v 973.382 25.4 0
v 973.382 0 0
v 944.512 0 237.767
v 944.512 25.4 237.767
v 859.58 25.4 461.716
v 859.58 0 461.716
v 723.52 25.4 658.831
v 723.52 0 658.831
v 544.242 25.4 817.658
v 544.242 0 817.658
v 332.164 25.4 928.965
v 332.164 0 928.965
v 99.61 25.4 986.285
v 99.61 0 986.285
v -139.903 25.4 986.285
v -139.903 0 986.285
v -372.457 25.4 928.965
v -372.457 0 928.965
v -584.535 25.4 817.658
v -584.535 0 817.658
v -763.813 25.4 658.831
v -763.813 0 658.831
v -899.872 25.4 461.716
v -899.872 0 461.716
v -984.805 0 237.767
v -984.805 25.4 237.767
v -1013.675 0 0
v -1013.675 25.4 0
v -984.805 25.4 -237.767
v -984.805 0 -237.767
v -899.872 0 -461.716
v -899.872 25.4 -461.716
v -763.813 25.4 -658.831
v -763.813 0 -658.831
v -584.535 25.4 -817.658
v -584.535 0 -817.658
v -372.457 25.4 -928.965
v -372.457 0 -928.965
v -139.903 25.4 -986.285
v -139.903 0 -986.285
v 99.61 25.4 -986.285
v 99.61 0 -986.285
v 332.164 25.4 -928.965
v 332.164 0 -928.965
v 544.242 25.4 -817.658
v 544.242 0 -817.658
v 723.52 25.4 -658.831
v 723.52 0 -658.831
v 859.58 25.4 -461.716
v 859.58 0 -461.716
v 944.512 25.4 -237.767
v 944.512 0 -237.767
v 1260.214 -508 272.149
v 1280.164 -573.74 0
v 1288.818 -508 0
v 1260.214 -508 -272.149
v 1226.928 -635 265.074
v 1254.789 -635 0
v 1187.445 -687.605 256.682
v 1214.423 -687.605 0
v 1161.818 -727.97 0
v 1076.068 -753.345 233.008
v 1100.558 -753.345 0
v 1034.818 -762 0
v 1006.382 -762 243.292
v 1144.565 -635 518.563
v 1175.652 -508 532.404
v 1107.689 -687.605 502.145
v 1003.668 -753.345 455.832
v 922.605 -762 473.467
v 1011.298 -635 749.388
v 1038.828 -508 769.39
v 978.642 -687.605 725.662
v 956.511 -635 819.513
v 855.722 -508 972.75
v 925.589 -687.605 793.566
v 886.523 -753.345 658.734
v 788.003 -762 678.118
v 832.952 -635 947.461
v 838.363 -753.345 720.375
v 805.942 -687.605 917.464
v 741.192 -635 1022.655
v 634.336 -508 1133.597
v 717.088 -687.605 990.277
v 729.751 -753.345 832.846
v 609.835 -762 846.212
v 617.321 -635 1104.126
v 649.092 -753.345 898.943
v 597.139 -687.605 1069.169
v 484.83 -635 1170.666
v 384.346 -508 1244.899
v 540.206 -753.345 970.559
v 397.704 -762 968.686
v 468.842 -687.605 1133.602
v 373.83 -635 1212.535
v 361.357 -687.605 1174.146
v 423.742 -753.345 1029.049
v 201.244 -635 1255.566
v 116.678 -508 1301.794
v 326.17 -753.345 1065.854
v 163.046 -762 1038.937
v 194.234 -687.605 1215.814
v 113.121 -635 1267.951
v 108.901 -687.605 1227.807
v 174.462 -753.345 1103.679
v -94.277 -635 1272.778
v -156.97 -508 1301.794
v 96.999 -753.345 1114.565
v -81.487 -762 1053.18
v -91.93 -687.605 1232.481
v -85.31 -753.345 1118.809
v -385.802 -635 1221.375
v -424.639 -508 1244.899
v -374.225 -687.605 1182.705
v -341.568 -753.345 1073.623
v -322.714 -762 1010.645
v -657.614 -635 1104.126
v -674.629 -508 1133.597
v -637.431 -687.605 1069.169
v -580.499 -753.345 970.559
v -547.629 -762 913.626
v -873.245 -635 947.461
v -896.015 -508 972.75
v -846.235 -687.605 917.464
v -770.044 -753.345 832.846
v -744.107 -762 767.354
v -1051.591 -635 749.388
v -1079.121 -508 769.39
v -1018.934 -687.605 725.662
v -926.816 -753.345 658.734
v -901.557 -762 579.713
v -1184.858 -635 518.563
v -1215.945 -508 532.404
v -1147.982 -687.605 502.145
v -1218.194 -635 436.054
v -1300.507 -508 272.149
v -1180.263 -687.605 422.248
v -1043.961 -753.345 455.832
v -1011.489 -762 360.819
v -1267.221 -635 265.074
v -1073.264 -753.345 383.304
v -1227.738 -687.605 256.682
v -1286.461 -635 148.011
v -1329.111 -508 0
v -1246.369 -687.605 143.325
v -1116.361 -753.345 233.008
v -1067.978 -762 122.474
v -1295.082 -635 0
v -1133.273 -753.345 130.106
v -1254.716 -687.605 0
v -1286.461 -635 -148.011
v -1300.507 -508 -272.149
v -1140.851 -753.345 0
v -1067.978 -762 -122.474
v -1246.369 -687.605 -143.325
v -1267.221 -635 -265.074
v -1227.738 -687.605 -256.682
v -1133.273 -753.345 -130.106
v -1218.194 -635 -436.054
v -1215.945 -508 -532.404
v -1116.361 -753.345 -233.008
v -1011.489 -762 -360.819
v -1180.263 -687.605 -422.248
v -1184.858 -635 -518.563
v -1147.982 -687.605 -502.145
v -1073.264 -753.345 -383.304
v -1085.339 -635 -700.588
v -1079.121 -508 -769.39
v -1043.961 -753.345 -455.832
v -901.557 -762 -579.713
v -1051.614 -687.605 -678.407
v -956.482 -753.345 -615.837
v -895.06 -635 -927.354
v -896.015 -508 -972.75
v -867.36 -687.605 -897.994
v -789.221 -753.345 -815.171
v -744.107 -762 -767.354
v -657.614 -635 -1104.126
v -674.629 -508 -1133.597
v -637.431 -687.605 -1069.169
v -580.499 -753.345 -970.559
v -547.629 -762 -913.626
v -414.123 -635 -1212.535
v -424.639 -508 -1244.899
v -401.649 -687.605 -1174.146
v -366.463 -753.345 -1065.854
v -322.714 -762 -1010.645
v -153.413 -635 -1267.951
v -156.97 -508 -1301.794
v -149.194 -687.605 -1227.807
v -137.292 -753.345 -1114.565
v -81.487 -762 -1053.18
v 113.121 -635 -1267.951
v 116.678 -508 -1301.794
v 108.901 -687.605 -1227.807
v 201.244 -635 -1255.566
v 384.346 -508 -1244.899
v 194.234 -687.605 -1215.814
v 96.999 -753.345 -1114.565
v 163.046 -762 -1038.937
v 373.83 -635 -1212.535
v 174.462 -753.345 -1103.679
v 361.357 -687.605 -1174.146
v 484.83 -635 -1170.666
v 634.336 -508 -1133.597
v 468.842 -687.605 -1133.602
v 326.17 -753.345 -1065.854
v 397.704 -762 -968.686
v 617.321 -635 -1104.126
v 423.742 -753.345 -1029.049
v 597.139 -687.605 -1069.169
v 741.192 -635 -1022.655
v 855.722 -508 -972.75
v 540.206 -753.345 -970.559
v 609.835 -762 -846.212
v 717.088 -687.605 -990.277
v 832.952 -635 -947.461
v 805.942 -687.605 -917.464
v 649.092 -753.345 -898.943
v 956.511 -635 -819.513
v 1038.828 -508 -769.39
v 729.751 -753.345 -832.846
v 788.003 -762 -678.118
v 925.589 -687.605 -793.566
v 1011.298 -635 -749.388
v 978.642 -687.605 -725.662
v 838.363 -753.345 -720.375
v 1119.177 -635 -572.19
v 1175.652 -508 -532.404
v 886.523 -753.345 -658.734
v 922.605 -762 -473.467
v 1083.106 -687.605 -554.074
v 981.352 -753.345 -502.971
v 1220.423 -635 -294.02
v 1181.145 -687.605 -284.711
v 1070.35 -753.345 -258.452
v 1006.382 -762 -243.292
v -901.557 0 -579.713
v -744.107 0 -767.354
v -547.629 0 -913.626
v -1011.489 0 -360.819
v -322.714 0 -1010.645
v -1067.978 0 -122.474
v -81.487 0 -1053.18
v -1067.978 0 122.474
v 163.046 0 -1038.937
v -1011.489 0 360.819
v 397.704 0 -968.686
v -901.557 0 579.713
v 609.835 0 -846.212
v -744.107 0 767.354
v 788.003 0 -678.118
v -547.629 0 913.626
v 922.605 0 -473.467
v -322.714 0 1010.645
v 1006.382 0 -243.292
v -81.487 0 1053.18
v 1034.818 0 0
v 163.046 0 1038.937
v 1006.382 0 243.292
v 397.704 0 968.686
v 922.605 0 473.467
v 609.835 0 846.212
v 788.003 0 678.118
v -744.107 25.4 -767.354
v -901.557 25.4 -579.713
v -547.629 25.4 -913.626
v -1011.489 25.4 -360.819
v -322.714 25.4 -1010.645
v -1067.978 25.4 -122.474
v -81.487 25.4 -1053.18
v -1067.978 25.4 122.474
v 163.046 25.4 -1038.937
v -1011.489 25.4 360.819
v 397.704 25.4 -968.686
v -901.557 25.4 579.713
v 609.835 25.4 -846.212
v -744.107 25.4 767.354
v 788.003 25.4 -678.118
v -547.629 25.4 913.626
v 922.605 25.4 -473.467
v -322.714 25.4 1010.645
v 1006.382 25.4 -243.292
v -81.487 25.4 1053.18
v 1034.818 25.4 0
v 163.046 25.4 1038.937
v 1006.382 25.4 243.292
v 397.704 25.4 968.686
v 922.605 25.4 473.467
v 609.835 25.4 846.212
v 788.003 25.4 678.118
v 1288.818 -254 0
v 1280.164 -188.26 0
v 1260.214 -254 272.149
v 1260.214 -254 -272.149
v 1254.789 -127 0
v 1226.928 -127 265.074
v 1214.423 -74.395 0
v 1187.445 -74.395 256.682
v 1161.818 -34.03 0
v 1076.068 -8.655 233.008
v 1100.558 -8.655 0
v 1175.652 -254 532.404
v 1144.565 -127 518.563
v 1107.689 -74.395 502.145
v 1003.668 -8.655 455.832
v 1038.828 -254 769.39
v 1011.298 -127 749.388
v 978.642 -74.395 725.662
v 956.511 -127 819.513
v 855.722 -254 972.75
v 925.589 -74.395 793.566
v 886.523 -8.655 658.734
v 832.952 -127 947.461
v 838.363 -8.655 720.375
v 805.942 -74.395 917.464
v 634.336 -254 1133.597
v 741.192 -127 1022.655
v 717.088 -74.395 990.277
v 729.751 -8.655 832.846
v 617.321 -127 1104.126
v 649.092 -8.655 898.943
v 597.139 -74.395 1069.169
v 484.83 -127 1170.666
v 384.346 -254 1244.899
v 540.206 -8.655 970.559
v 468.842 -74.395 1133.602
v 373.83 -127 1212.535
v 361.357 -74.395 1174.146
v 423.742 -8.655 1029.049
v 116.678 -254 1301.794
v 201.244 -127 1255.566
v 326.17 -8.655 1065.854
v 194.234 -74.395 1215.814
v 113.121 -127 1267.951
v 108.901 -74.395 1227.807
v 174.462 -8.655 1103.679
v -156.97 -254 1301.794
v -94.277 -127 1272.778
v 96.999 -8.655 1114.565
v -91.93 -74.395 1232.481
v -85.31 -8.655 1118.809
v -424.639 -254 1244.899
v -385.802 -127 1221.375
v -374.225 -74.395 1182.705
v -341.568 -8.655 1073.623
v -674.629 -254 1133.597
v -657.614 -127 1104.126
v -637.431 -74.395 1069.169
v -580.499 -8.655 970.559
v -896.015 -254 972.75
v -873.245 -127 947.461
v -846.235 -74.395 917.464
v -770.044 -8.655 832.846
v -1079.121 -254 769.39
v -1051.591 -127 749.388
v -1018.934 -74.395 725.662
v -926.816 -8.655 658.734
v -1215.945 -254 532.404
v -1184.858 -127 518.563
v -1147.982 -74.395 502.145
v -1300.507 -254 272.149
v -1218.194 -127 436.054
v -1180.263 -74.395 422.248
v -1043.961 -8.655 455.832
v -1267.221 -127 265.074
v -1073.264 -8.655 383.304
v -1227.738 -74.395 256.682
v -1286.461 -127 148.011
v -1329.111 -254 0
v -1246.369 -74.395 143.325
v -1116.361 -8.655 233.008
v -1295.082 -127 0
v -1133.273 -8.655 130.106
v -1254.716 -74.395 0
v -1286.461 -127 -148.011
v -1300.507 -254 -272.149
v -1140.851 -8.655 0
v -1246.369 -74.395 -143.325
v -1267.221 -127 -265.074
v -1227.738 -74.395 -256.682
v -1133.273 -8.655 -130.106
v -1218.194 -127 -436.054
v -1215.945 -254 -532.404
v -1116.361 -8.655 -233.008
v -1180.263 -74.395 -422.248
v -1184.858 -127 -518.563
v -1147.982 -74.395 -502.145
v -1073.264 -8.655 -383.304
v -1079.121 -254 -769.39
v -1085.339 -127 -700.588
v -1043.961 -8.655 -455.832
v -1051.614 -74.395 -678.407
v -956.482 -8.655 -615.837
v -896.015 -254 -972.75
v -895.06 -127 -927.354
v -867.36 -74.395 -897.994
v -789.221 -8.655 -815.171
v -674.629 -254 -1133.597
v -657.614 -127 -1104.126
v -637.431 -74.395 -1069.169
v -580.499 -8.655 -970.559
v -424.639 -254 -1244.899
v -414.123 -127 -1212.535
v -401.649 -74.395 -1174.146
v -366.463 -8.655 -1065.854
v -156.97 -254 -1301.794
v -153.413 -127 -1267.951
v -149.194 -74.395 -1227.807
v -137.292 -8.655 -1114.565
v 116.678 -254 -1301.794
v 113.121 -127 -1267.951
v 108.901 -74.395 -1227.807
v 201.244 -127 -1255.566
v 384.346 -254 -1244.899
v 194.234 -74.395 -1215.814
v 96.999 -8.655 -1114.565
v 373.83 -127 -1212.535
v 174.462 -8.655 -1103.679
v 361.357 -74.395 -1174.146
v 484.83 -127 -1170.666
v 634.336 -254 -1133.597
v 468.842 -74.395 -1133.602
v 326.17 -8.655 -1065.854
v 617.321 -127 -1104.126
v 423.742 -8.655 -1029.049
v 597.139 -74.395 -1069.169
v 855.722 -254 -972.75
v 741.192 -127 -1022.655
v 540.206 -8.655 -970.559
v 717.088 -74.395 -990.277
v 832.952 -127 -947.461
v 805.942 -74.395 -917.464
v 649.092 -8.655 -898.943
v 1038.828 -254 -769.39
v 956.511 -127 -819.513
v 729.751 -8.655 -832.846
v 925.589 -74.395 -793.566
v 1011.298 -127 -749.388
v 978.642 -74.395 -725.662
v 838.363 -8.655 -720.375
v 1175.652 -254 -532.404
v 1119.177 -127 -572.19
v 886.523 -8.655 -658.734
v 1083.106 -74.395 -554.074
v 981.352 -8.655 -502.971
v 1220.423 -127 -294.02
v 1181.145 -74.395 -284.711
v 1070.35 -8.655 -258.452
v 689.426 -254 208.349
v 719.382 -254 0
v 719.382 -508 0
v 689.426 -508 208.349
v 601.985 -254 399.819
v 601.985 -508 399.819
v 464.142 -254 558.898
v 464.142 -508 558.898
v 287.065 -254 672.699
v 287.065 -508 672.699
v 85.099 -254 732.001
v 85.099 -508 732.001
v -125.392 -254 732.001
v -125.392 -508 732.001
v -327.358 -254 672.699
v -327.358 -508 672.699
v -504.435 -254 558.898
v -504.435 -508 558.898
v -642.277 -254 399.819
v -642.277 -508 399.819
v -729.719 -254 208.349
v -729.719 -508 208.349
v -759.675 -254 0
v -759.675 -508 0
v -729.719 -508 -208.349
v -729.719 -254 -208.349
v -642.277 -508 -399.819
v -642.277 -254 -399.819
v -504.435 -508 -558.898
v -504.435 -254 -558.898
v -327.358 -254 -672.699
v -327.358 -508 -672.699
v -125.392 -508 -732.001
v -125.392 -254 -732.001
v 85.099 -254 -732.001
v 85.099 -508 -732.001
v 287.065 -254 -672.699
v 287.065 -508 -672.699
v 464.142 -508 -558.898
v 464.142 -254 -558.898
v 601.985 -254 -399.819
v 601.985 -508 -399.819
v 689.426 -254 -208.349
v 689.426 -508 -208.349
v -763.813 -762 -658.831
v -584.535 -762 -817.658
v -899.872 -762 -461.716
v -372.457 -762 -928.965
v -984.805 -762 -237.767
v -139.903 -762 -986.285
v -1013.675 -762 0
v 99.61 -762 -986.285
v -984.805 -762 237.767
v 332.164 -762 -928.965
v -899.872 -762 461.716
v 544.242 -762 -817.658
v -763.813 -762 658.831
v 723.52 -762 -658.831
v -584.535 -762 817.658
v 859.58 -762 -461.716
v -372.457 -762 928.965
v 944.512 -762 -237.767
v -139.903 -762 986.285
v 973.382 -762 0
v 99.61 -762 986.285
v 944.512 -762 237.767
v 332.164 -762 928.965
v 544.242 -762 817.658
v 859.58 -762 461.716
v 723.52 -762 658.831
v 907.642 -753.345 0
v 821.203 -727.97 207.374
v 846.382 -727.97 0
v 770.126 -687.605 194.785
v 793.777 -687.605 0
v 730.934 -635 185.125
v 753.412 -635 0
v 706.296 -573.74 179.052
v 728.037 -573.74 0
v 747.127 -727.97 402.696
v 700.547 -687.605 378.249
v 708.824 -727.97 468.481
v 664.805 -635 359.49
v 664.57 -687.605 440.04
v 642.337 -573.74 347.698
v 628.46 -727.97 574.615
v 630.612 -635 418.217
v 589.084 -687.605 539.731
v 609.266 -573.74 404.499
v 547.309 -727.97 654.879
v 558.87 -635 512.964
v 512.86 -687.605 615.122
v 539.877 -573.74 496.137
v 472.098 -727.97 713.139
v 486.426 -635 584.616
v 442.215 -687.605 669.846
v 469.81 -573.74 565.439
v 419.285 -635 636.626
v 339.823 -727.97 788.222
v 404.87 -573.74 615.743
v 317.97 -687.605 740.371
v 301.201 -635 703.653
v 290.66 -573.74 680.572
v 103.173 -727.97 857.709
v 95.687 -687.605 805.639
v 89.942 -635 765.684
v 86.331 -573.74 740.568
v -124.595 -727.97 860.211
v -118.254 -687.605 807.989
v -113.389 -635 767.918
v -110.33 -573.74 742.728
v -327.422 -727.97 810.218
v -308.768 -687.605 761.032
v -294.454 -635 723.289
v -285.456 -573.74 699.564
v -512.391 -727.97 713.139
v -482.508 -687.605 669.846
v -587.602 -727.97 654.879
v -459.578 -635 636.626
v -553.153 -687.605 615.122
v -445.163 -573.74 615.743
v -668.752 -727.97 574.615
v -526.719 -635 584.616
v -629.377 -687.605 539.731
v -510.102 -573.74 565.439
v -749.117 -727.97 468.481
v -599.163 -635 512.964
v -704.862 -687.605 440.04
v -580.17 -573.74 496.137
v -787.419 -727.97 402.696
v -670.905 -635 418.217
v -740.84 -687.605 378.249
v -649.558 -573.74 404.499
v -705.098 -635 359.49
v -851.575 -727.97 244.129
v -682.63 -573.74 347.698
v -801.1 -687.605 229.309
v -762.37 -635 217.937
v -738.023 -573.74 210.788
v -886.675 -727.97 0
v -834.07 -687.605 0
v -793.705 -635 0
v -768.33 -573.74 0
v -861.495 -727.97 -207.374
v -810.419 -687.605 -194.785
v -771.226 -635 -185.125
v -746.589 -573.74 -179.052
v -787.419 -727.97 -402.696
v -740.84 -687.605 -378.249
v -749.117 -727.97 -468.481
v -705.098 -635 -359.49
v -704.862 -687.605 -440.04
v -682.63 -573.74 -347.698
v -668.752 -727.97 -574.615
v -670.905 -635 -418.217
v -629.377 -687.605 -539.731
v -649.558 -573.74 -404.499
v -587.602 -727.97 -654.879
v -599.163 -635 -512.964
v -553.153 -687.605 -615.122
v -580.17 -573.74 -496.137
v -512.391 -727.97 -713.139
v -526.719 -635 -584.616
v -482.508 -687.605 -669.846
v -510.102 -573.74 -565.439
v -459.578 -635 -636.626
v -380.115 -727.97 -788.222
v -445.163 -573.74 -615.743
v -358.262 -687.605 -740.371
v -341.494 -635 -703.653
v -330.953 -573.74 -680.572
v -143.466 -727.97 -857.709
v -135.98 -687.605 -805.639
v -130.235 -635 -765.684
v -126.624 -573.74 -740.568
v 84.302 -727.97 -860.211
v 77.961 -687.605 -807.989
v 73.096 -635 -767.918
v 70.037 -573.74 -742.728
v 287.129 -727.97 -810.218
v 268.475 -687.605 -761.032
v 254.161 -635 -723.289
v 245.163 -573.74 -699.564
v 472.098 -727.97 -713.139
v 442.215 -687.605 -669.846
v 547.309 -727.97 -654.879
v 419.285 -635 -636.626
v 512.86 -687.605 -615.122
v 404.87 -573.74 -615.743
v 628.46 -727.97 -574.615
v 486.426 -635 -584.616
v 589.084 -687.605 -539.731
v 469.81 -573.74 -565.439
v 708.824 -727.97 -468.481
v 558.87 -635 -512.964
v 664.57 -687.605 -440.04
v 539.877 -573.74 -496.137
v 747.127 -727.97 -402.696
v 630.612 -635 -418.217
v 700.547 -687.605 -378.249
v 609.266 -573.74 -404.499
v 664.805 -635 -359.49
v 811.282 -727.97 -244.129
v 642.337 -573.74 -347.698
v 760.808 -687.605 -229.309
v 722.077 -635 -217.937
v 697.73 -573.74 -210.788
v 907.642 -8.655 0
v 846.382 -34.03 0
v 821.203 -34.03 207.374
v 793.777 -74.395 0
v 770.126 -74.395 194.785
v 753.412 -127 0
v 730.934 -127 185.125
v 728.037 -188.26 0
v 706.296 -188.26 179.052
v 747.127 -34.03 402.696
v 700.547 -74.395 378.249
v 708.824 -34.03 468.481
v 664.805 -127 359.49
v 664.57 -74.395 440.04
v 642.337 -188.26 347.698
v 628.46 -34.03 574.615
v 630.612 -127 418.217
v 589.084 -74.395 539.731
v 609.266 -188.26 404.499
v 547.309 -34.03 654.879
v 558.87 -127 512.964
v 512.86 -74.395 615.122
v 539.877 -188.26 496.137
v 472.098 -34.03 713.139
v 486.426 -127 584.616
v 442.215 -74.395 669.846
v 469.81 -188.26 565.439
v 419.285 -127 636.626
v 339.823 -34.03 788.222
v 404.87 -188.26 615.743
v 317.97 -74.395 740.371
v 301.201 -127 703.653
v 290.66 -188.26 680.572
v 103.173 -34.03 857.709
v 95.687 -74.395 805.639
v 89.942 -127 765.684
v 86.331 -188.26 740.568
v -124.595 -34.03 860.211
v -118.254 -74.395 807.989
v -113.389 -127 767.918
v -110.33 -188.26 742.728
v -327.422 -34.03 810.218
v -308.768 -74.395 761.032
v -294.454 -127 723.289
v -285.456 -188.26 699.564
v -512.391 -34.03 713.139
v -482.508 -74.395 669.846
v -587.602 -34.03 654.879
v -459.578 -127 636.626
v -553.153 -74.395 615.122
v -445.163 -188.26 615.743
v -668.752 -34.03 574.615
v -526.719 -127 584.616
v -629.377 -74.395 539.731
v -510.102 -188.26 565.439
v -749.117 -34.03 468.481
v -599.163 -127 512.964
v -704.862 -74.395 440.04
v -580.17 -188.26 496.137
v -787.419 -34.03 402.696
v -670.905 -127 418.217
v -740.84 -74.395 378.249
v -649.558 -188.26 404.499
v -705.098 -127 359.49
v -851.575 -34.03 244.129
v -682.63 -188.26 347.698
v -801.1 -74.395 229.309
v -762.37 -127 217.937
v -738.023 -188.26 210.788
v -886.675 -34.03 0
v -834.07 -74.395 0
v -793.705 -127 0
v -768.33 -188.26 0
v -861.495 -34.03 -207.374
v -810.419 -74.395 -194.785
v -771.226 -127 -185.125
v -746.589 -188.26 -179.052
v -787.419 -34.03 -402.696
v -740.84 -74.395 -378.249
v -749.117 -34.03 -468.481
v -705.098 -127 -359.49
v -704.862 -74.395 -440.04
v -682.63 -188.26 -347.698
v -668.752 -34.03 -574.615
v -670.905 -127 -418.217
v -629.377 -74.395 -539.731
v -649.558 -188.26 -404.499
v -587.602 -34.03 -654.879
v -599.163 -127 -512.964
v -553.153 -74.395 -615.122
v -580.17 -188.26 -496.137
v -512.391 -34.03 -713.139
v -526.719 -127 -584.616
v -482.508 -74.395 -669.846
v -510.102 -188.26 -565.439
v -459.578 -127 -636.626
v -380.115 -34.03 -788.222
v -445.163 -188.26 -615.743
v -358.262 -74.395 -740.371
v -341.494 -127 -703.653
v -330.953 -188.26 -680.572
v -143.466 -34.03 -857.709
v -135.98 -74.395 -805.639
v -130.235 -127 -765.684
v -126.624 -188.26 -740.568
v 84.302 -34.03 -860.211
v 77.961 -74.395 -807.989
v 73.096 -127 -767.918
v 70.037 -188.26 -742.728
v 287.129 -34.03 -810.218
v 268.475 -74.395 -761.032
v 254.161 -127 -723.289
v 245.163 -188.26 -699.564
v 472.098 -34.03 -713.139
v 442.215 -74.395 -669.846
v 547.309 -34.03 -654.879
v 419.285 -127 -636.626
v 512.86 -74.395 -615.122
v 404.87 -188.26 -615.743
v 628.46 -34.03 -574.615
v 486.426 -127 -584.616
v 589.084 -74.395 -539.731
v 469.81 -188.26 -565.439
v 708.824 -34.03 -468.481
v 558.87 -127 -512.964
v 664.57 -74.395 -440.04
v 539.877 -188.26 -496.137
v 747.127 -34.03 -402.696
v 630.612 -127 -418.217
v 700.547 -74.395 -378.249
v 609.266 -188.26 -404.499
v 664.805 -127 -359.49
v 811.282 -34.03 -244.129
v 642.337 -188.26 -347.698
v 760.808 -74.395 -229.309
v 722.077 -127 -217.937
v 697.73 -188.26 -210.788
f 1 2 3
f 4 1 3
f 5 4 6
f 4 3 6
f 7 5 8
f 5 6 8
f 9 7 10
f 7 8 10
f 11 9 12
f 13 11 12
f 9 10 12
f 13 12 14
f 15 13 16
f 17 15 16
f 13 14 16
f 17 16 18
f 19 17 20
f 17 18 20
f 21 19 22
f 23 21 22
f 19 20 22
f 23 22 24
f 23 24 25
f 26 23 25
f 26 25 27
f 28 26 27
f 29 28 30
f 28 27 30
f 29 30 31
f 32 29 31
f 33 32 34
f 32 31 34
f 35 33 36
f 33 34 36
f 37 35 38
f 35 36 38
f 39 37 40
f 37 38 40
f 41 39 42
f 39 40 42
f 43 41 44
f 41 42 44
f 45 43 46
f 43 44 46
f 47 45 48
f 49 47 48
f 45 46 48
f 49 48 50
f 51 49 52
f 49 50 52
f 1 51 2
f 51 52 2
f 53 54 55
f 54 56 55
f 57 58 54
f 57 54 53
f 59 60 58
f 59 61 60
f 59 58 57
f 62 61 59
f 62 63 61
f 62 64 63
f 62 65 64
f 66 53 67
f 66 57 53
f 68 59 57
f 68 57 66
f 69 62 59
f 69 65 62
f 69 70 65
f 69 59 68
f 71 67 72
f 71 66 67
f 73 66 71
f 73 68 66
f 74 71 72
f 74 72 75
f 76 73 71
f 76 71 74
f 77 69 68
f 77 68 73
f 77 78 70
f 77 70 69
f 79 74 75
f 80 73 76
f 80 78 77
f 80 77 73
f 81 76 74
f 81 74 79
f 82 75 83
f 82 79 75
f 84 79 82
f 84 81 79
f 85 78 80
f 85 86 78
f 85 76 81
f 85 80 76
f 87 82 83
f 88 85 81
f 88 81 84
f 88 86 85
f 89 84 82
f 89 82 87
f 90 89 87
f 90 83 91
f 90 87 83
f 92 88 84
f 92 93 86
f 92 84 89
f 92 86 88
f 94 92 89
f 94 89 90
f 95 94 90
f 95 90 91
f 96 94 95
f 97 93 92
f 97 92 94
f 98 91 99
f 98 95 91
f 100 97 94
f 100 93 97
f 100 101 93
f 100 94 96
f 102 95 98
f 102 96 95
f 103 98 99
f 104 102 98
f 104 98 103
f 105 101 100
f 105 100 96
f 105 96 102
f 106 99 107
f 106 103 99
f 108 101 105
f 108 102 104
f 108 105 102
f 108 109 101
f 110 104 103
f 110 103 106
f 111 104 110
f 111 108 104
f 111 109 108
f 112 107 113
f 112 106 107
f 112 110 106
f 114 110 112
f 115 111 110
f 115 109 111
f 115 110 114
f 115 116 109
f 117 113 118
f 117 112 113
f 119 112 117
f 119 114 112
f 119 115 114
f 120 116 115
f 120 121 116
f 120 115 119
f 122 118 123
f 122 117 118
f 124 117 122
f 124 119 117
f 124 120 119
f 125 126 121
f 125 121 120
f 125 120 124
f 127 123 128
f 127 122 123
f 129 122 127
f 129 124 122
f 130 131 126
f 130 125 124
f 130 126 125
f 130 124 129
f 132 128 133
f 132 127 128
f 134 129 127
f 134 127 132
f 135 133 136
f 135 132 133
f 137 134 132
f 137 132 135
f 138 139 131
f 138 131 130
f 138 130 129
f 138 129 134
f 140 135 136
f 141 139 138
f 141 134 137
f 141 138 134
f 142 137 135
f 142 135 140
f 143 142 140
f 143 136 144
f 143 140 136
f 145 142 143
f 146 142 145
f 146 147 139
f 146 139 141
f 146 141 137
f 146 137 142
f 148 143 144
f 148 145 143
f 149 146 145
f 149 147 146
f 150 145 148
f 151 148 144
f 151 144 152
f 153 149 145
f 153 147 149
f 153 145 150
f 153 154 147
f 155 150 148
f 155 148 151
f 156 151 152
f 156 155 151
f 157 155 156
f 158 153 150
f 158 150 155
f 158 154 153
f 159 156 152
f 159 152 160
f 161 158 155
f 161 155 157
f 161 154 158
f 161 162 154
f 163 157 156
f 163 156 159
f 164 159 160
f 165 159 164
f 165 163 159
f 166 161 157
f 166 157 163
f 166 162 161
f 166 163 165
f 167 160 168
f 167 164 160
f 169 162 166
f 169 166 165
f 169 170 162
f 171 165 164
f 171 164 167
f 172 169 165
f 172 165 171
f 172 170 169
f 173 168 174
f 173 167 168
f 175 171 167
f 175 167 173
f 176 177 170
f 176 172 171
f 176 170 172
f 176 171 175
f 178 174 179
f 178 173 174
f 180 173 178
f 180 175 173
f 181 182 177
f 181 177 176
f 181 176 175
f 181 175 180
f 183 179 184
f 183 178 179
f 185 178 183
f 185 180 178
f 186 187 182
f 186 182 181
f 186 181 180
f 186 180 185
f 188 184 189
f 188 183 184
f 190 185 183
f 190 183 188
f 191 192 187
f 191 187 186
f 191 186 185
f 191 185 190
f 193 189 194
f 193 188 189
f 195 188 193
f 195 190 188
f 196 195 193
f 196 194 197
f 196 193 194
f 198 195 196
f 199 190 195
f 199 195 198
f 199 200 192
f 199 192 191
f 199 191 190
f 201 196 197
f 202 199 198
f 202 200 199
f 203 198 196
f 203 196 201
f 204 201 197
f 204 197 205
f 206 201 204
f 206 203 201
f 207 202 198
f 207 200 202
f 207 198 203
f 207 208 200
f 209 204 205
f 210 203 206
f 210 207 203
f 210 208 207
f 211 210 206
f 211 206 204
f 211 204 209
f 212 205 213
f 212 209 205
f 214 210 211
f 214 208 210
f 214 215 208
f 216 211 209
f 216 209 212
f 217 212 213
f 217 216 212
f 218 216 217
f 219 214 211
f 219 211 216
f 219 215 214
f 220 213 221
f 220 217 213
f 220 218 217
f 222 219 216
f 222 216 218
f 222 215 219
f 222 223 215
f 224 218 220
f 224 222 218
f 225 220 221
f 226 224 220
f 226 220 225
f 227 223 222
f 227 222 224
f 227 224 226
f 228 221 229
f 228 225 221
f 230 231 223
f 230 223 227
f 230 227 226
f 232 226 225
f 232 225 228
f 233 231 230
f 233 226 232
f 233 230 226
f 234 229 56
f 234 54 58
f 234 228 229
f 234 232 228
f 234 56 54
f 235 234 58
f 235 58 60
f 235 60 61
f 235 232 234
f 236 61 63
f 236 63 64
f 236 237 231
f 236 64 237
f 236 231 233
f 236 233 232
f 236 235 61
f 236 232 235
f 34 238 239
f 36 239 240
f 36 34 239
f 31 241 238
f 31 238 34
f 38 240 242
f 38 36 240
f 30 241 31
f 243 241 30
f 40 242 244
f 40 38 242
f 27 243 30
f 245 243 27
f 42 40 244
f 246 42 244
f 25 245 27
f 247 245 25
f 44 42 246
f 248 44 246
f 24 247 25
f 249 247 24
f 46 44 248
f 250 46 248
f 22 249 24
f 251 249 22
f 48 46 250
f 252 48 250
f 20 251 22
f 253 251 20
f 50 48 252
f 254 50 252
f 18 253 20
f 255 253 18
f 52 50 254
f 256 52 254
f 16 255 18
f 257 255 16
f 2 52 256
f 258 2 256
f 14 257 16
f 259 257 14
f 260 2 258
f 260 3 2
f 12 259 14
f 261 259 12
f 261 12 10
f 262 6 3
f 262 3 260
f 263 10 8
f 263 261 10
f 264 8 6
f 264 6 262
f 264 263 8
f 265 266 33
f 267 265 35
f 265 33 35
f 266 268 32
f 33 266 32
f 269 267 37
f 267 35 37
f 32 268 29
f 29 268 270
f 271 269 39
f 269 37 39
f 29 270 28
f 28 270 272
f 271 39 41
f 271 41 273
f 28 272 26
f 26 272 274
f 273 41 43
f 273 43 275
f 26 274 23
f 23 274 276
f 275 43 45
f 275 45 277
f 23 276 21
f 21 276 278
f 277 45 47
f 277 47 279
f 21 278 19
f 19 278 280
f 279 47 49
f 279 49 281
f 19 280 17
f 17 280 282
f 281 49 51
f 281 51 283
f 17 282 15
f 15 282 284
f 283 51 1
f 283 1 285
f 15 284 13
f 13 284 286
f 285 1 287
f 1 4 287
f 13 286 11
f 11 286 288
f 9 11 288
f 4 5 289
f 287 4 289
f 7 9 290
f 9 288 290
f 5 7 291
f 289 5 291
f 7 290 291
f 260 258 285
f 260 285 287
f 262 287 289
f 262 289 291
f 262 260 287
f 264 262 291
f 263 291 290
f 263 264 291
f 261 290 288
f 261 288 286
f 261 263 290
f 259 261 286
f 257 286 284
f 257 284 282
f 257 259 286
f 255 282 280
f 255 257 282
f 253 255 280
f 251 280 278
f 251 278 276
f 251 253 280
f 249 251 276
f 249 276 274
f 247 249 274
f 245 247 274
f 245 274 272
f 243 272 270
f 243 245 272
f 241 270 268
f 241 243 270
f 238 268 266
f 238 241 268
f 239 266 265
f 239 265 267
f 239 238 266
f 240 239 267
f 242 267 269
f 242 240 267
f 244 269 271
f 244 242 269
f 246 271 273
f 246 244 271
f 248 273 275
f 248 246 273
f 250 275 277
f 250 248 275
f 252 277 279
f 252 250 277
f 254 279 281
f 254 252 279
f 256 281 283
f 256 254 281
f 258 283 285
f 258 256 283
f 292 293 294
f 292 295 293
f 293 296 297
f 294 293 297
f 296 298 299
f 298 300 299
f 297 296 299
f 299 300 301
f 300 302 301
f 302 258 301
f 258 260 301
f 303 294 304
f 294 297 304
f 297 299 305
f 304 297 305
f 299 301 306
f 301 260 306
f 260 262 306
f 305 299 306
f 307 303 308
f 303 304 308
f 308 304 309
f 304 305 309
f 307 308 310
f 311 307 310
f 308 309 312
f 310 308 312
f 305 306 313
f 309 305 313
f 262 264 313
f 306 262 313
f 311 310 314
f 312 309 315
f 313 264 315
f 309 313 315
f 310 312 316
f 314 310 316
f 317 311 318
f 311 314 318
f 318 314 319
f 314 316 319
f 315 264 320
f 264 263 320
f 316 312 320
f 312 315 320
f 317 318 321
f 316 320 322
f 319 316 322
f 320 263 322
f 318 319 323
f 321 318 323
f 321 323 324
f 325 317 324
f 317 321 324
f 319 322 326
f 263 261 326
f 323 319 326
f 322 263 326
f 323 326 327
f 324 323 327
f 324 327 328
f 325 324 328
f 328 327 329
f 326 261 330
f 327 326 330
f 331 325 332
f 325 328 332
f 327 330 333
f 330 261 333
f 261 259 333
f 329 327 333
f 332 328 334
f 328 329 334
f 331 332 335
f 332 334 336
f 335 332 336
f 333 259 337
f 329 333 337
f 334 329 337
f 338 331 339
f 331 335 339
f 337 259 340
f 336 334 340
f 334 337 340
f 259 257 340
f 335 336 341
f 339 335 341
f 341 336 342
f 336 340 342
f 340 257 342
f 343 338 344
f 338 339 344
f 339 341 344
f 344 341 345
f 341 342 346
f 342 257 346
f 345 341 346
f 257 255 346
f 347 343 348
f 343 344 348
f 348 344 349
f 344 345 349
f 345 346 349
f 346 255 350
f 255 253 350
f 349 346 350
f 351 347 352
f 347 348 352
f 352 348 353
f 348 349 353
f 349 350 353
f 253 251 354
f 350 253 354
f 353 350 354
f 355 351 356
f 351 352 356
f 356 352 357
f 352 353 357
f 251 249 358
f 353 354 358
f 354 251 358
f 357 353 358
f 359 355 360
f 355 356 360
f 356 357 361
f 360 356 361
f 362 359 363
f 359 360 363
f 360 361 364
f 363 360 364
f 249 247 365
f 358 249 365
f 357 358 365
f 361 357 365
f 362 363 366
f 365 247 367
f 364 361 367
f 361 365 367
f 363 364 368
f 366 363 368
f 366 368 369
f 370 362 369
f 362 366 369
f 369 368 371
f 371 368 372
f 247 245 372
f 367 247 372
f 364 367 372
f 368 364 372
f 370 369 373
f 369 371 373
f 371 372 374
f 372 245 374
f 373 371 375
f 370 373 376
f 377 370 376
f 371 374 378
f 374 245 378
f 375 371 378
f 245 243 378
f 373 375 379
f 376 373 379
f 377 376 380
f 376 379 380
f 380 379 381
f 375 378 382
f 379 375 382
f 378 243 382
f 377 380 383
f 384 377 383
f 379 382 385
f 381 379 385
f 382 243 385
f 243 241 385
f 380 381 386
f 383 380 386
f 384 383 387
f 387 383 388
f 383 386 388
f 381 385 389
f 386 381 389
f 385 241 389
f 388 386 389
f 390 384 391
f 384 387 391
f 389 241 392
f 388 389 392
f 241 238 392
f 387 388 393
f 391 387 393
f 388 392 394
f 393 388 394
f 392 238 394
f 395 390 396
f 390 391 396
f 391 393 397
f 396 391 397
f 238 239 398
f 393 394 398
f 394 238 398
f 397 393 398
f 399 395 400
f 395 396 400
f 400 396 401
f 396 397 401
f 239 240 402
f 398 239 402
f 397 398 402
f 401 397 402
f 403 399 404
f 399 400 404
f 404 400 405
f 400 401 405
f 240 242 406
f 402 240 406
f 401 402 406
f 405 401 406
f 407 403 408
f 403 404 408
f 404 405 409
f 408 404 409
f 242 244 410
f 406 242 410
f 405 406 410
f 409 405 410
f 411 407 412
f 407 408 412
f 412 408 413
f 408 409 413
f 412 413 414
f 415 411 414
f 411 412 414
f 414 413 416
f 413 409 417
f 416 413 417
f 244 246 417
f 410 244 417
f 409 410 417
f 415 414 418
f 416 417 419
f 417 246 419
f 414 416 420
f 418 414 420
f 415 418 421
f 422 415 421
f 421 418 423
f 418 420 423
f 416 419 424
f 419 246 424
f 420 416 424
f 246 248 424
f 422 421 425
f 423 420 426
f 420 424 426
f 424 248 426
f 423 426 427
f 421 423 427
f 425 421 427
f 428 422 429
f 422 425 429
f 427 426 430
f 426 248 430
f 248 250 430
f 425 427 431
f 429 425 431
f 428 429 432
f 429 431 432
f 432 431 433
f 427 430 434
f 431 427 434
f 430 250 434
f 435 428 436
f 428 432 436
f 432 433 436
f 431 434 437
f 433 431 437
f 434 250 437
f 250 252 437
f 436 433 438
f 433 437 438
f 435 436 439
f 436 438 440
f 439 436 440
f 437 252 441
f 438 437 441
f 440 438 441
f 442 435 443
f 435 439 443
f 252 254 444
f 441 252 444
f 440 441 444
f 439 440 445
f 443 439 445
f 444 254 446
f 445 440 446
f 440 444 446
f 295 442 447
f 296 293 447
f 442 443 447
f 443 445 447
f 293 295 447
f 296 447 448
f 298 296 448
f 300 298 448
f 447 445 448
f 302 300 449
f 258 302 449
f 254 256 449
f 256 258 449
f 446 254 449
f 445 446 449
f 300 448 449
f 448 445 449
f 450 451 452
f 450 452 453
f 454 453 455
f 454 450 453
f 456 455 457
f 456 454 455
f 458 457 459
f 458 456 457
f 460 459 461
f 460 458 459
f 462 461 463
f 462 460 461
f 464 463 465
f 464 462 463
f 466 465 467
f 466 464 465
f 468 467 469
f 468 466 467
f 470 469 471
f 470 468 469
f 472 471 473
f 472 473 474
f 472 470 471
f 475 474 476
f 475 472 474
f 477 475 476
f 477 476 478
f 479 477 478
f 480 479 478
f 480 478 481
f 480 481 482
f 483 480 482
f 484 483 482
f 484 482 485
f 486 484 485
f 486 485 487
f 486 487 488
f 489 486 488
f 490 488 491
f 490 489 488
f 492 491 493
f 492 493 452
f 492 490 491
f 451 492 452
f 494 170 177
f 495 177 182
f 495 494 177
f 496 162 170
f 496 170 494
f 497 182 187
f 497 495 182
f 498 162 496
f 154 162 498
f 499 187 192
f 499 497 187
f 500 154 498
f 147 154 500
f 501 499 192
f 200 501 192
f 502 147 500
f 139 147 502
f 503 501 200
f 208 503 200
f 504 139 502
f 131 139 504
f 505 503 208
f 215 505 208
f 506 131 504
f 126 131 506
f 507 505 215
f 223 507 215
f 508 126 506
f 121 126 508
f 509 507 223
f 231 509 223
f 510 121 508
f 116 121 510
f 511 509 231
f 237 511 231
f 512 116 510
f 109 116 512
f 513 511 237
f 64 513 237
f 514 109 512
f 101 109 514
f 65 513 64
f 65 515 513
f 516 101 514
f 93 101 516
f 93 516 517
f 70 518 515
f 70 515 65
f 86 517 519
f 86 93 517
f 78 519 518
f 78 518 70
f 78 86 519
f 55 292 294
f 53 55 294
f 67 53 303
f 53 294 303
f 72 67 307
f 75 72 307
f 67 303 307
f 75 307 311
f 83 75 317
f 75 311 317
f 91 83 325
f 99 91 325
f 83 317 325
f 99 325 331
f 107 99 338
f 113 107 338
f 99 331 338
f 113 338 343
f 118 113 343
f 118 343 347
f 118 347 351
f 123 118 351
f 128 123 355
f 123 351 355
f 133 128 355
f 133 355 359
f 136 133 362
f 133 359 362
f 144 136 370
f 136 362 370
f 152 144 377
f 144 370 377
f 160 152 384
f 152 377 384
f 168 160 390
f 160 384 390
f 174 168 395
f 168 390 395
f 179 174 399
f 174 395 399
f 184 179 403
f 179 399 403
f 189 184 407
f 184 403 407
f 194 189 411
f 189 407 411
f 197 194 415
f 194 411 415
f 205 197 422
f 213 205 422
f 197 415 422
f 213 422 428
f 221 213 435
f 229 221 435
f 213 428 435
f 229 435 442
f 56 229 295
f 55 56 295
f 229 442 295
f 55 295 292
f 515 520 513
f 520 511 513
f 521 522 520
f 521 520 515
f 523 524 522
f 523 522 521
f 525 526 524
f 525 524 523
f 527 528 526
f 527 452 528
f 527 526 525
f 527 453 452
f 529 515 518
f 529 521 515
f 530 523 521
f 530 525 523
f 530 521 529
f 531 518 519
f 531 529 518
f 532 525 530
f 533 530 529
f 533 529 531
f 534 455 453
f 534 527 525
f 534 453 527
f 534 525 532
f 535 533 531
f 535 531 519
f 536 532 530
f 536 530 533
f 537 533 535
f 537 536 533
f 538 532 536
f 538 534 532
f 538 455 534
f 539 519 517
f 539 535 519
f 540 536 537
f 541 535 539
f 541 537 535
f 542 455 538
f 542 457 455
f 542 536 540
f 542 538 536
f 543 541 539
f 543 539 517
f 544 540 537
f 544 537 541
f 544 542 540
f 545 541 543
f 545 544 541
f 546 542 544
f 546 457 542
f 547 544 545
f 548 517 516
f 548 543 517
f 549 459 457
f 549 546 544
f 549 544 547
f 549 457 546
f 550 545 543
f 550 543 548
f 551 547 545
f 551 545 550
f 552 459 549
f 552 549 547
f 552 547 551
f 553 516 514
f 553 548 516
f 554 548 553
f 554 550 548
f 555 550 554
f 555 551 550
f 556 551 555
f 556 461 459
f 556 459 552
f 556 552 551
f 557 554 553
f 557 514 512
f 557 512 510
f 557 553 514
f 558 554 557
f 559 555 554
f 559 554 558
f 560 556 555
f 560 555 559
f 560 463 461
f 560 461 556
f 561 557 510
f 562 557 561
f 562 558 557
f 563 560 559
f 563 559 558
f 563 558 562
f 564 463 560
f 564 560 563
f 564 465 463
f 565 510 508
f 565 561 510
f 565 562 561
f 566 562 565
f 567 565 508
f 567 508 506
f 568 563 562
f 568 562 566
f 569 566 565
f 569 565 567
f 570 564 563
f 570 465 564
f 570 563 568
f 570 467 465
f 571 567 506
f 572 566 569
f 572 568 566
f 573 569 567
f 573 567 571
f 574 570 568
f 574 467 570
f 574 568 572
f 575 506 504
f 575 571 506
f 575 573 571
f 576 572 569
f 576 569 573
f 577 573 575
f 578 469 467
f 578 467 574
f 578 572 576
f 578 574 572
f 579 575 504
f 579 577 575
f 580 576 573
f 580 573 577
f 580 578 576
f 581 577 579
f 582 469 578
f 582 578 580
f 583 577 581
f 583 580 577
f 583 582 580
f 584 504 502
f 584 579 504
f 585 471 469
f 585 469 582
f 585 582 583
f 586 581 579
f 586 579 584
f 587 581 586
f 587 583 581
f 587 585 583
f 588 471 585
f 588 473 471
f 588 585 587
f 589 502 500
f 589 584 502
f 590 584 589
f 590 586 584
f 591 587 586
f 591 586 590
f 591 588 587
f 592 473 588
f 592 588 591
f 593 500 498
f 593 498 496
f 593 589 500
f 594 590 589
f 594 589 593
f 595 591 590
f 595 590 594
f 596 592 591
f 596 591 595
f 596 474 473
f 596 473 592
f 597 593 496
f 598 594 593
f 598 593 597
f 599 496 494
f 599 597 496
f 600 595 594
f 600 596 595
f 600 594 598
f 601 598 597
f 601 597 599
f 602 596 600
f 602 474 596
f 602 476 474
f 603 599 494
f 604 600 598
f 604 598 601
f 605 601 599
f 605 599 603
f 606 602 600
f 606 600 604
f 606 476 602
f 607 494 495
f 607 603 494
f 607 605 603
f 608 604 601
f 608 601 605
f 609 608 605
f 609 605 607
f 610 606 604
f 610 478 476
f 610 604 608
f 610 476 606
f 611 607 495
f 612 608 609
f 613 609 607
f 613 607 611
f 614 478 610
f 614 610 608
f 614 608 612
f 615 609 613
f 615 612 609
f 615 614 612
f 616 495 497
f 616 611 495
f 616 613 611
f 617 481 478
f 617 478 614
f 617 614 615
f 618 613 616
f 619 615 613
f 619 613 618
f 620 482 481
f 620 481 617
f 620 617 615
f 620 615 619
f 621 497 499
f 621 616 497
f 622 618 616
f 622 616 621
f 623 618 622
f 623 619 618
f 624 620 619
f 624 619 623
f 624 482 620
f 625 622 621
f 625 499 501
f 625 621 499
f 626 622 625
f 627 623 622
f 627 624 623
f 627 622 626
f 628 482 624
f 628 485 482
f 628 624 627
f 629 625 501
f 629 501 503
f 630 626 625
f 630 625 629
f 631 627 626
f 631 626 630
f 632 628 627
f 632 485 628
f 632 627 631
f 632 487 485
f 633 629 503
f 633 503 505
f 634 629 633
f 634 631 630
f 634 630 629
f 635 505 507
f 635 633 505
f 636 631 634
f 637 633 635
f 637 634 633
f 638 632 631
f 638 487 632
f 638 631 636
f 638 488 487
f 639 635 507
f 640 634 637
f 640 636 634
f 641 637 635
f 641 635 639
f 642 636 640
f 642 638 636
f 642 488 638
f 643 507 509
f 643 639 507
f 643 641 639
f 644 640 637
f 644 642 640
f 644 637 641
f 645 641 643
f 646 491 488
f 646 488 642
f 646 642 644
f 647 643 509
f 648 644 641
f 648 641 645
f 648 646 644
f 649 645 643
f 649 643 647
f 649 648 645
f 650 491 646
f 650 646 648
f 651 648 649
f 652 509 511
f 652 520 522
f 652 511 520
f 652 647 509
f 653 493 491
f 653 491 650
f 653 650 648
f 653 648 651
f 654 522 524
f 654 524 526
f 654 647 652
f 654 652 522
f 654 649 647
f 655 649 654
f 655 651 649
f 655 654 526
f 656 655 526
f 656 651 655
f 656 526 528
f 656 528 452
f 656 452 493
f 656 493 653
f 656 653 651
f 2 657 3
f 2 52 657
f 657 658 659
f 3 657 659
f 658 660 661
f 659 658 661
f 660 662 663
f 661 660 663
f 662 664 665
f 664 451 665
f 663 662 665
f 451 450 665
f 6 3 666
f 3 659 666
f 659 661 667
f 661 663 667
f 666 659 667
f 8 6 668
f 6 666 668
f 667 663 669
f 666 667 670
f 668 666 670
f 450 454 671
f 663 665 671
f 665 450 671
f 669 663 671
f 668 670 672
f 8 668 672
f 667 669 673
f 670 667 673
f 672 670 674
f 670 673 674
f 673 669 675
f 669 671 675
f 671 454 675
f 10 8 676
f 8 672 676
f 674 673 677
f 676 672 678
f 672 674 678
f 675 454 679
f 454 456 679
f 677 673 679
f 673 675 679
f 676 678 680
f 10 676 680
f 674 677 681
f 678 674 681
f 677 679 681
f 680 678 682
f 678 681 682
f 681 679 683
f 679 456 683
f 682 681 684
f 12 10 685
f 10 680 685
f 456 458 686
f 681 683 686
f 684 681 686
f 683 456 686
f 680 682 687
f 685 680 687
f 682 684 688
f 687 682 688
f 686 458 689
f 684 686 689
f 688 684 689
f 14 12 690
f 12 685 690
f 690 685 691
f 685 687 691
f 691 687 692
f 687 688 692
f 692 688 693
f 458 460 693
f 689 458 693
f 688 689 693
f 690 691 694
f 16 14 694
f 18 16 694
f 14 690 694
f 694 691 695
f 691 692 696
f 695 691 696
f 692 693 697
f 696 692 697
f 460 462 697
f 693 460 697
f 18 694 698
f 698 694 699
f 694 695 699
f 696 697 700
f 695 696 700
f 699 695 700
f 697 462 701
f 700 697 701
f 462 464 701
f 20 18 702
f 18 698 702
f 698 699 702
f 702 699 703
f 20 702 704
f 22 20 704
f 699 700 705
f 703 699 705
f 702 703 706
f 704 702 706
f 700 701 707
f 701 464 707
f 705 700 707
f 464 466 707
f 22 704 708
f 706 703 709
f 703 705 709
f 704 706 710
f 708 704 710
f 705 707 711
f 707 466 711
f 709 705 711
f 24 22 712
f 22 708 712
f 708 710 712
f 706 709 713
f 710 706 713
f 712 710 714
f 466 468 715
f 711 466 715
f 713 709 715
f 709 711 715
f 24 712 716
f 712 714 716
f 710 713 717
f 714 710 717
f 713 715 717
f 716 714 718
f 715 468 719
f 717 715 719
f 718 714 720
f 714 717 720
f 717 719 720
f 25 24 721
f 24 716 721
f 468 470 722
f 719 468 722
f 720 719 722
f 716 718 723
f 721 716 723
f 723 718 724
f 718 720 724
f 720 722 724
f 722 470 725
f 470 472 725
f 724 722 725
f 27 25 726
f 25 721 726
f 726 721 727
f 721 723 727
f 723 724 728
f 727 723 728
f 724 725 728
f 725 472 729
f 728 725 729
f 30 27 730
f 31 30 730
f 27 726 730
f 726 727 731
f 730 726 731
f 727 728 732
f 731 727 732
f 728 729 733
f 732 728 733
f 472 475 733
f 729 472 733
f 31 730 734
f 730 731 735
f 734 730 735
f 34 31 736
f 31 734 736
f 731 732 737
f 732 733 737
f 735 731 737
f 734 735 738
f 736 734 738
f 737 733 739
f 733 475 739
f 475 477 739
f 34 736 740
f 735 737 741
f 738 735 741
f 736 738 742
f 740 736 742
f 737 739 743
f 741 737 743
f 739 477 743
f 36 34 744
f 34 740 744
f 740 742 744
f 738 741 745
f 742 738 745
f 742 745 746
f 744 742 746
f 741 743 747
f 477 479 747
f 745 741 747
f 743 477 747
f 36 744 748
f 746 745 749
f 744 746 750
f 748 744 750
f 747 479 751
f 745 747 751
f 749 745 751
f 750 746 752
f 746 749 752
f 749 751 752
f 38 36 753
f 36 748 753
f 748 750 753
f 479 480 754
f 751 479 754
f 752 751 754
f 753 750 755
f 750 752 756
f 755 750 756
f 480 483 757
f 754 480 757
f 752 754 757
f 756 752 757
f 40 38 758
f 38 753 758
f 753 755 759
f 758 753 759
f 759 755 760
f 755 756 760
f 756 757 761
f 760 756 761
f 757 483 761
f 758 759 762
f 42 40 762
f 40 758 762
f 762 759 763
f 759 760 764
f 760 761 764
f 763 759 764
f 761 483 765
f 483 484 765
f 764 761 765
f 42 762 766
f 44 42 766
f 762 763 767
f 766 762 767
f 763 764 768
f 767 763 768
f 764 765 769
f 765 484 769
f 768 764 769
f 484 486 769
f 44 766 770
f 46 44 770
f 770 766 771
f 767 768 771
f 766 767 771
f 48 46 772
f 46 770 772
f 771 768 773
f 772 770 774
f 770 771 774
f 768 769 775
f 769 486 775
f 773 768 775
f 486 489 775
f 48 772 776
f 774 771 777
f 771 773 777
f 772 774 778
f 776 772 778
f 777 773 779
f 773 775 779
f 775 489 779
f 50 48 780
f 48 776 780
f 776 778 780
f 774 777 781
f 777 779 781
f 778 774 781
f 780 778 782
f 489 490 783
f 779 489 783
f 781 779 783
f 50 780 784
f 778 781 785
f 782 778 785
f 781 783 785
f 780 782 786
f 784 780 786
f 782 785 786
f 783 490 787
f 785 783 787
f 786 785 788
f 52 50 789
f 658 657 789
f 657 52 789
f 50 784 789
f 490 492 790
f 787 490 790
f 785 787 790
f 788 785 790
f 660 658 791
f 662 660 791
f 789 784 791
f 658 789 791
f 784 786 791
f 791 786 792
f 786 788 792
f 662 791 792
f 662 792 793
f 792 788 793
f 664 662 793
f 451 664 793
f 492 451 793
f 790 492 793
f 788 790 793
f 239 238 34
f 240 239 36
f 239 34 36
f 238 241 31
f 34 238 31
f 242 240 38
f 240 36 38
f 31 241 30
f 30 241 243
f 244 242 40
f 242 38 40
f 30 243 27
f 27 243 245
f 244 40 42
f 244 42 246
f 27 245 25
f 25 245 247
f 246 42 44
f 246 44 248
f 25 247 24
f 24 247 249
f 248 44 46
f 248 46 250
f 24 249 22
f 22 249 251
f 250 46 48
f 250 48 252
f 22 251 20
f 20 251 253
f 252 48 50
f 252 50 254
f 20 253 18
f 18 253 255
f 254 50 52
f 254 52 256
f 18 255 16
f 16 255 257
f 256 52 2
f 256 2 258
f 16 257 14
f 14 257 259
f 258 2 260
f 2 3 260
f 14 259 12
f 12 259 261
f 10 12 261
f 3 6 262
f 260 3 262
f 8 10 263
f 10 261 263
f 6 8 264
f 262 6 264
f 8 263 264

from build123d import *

# Parameters (mm, degrees)
F0_R     = 1308.9647443453
F0_R_2   = 739.5286574093
F1_DEPTH = 762
F2_R     = 254
F3_R     = 254
F4_R     = 254
F5_DEPTH = 25.4


with BuildPart() as f1:
    # F0 (on Front) → F1 (new body)
    with BuildSketch(Plane.XZ):
        with Locations((-20.1464034617, 0)):
            Circle(F0_R)
        with Locations((-20.1464034617, 0)):
            Circle(F0_R_2, mode=Mode.SUBTRACT)
    extrude(amount=F1_DEPTH)

    # F2
    f2_edges = [f1.edges().sort_by_distance(p)[0] for p in [
        (-1329.111148, 0, 0),
    ]]
    fillet(f2_edges, radius=F2_R)

    # F3
    f3_edges = [f1.edges().sort_by_distance(p)[0] for p in [
        (-1329.111148, -762, 0),
        (-759.675061, -762, 0),
    ]]
    fillet(f3_edges, radius=F3_R)

    # F4
    f4_edges = [f1.edges().sort_by_distance(p)[0] for p in [
        (719.382254, -254, 0),
        (-759.675061, -508, 0),
        (-759.675061, 0, 0),
        (-1075.111148, -762, 0),
        (-1013.675061, -762, 0),
        (1288.818341, -381, 0),
        (-1329.111148, -508, 0),
        (-1329.111148, -254, 0),
    ]]
    fillet(f4_edges, radius=F4_R)


with BuildPart() as f5:
    # F5 (new): a face of the model
    f5_faces = [f1.part.faces().sort_by_distance(p)[0] for p in [
        (-1043.5139698566, 0, 0),
    ]]
    extrude(f5_faces, amount=F5_DEPTH)


solid = Compound([f1.part, f5.part])
